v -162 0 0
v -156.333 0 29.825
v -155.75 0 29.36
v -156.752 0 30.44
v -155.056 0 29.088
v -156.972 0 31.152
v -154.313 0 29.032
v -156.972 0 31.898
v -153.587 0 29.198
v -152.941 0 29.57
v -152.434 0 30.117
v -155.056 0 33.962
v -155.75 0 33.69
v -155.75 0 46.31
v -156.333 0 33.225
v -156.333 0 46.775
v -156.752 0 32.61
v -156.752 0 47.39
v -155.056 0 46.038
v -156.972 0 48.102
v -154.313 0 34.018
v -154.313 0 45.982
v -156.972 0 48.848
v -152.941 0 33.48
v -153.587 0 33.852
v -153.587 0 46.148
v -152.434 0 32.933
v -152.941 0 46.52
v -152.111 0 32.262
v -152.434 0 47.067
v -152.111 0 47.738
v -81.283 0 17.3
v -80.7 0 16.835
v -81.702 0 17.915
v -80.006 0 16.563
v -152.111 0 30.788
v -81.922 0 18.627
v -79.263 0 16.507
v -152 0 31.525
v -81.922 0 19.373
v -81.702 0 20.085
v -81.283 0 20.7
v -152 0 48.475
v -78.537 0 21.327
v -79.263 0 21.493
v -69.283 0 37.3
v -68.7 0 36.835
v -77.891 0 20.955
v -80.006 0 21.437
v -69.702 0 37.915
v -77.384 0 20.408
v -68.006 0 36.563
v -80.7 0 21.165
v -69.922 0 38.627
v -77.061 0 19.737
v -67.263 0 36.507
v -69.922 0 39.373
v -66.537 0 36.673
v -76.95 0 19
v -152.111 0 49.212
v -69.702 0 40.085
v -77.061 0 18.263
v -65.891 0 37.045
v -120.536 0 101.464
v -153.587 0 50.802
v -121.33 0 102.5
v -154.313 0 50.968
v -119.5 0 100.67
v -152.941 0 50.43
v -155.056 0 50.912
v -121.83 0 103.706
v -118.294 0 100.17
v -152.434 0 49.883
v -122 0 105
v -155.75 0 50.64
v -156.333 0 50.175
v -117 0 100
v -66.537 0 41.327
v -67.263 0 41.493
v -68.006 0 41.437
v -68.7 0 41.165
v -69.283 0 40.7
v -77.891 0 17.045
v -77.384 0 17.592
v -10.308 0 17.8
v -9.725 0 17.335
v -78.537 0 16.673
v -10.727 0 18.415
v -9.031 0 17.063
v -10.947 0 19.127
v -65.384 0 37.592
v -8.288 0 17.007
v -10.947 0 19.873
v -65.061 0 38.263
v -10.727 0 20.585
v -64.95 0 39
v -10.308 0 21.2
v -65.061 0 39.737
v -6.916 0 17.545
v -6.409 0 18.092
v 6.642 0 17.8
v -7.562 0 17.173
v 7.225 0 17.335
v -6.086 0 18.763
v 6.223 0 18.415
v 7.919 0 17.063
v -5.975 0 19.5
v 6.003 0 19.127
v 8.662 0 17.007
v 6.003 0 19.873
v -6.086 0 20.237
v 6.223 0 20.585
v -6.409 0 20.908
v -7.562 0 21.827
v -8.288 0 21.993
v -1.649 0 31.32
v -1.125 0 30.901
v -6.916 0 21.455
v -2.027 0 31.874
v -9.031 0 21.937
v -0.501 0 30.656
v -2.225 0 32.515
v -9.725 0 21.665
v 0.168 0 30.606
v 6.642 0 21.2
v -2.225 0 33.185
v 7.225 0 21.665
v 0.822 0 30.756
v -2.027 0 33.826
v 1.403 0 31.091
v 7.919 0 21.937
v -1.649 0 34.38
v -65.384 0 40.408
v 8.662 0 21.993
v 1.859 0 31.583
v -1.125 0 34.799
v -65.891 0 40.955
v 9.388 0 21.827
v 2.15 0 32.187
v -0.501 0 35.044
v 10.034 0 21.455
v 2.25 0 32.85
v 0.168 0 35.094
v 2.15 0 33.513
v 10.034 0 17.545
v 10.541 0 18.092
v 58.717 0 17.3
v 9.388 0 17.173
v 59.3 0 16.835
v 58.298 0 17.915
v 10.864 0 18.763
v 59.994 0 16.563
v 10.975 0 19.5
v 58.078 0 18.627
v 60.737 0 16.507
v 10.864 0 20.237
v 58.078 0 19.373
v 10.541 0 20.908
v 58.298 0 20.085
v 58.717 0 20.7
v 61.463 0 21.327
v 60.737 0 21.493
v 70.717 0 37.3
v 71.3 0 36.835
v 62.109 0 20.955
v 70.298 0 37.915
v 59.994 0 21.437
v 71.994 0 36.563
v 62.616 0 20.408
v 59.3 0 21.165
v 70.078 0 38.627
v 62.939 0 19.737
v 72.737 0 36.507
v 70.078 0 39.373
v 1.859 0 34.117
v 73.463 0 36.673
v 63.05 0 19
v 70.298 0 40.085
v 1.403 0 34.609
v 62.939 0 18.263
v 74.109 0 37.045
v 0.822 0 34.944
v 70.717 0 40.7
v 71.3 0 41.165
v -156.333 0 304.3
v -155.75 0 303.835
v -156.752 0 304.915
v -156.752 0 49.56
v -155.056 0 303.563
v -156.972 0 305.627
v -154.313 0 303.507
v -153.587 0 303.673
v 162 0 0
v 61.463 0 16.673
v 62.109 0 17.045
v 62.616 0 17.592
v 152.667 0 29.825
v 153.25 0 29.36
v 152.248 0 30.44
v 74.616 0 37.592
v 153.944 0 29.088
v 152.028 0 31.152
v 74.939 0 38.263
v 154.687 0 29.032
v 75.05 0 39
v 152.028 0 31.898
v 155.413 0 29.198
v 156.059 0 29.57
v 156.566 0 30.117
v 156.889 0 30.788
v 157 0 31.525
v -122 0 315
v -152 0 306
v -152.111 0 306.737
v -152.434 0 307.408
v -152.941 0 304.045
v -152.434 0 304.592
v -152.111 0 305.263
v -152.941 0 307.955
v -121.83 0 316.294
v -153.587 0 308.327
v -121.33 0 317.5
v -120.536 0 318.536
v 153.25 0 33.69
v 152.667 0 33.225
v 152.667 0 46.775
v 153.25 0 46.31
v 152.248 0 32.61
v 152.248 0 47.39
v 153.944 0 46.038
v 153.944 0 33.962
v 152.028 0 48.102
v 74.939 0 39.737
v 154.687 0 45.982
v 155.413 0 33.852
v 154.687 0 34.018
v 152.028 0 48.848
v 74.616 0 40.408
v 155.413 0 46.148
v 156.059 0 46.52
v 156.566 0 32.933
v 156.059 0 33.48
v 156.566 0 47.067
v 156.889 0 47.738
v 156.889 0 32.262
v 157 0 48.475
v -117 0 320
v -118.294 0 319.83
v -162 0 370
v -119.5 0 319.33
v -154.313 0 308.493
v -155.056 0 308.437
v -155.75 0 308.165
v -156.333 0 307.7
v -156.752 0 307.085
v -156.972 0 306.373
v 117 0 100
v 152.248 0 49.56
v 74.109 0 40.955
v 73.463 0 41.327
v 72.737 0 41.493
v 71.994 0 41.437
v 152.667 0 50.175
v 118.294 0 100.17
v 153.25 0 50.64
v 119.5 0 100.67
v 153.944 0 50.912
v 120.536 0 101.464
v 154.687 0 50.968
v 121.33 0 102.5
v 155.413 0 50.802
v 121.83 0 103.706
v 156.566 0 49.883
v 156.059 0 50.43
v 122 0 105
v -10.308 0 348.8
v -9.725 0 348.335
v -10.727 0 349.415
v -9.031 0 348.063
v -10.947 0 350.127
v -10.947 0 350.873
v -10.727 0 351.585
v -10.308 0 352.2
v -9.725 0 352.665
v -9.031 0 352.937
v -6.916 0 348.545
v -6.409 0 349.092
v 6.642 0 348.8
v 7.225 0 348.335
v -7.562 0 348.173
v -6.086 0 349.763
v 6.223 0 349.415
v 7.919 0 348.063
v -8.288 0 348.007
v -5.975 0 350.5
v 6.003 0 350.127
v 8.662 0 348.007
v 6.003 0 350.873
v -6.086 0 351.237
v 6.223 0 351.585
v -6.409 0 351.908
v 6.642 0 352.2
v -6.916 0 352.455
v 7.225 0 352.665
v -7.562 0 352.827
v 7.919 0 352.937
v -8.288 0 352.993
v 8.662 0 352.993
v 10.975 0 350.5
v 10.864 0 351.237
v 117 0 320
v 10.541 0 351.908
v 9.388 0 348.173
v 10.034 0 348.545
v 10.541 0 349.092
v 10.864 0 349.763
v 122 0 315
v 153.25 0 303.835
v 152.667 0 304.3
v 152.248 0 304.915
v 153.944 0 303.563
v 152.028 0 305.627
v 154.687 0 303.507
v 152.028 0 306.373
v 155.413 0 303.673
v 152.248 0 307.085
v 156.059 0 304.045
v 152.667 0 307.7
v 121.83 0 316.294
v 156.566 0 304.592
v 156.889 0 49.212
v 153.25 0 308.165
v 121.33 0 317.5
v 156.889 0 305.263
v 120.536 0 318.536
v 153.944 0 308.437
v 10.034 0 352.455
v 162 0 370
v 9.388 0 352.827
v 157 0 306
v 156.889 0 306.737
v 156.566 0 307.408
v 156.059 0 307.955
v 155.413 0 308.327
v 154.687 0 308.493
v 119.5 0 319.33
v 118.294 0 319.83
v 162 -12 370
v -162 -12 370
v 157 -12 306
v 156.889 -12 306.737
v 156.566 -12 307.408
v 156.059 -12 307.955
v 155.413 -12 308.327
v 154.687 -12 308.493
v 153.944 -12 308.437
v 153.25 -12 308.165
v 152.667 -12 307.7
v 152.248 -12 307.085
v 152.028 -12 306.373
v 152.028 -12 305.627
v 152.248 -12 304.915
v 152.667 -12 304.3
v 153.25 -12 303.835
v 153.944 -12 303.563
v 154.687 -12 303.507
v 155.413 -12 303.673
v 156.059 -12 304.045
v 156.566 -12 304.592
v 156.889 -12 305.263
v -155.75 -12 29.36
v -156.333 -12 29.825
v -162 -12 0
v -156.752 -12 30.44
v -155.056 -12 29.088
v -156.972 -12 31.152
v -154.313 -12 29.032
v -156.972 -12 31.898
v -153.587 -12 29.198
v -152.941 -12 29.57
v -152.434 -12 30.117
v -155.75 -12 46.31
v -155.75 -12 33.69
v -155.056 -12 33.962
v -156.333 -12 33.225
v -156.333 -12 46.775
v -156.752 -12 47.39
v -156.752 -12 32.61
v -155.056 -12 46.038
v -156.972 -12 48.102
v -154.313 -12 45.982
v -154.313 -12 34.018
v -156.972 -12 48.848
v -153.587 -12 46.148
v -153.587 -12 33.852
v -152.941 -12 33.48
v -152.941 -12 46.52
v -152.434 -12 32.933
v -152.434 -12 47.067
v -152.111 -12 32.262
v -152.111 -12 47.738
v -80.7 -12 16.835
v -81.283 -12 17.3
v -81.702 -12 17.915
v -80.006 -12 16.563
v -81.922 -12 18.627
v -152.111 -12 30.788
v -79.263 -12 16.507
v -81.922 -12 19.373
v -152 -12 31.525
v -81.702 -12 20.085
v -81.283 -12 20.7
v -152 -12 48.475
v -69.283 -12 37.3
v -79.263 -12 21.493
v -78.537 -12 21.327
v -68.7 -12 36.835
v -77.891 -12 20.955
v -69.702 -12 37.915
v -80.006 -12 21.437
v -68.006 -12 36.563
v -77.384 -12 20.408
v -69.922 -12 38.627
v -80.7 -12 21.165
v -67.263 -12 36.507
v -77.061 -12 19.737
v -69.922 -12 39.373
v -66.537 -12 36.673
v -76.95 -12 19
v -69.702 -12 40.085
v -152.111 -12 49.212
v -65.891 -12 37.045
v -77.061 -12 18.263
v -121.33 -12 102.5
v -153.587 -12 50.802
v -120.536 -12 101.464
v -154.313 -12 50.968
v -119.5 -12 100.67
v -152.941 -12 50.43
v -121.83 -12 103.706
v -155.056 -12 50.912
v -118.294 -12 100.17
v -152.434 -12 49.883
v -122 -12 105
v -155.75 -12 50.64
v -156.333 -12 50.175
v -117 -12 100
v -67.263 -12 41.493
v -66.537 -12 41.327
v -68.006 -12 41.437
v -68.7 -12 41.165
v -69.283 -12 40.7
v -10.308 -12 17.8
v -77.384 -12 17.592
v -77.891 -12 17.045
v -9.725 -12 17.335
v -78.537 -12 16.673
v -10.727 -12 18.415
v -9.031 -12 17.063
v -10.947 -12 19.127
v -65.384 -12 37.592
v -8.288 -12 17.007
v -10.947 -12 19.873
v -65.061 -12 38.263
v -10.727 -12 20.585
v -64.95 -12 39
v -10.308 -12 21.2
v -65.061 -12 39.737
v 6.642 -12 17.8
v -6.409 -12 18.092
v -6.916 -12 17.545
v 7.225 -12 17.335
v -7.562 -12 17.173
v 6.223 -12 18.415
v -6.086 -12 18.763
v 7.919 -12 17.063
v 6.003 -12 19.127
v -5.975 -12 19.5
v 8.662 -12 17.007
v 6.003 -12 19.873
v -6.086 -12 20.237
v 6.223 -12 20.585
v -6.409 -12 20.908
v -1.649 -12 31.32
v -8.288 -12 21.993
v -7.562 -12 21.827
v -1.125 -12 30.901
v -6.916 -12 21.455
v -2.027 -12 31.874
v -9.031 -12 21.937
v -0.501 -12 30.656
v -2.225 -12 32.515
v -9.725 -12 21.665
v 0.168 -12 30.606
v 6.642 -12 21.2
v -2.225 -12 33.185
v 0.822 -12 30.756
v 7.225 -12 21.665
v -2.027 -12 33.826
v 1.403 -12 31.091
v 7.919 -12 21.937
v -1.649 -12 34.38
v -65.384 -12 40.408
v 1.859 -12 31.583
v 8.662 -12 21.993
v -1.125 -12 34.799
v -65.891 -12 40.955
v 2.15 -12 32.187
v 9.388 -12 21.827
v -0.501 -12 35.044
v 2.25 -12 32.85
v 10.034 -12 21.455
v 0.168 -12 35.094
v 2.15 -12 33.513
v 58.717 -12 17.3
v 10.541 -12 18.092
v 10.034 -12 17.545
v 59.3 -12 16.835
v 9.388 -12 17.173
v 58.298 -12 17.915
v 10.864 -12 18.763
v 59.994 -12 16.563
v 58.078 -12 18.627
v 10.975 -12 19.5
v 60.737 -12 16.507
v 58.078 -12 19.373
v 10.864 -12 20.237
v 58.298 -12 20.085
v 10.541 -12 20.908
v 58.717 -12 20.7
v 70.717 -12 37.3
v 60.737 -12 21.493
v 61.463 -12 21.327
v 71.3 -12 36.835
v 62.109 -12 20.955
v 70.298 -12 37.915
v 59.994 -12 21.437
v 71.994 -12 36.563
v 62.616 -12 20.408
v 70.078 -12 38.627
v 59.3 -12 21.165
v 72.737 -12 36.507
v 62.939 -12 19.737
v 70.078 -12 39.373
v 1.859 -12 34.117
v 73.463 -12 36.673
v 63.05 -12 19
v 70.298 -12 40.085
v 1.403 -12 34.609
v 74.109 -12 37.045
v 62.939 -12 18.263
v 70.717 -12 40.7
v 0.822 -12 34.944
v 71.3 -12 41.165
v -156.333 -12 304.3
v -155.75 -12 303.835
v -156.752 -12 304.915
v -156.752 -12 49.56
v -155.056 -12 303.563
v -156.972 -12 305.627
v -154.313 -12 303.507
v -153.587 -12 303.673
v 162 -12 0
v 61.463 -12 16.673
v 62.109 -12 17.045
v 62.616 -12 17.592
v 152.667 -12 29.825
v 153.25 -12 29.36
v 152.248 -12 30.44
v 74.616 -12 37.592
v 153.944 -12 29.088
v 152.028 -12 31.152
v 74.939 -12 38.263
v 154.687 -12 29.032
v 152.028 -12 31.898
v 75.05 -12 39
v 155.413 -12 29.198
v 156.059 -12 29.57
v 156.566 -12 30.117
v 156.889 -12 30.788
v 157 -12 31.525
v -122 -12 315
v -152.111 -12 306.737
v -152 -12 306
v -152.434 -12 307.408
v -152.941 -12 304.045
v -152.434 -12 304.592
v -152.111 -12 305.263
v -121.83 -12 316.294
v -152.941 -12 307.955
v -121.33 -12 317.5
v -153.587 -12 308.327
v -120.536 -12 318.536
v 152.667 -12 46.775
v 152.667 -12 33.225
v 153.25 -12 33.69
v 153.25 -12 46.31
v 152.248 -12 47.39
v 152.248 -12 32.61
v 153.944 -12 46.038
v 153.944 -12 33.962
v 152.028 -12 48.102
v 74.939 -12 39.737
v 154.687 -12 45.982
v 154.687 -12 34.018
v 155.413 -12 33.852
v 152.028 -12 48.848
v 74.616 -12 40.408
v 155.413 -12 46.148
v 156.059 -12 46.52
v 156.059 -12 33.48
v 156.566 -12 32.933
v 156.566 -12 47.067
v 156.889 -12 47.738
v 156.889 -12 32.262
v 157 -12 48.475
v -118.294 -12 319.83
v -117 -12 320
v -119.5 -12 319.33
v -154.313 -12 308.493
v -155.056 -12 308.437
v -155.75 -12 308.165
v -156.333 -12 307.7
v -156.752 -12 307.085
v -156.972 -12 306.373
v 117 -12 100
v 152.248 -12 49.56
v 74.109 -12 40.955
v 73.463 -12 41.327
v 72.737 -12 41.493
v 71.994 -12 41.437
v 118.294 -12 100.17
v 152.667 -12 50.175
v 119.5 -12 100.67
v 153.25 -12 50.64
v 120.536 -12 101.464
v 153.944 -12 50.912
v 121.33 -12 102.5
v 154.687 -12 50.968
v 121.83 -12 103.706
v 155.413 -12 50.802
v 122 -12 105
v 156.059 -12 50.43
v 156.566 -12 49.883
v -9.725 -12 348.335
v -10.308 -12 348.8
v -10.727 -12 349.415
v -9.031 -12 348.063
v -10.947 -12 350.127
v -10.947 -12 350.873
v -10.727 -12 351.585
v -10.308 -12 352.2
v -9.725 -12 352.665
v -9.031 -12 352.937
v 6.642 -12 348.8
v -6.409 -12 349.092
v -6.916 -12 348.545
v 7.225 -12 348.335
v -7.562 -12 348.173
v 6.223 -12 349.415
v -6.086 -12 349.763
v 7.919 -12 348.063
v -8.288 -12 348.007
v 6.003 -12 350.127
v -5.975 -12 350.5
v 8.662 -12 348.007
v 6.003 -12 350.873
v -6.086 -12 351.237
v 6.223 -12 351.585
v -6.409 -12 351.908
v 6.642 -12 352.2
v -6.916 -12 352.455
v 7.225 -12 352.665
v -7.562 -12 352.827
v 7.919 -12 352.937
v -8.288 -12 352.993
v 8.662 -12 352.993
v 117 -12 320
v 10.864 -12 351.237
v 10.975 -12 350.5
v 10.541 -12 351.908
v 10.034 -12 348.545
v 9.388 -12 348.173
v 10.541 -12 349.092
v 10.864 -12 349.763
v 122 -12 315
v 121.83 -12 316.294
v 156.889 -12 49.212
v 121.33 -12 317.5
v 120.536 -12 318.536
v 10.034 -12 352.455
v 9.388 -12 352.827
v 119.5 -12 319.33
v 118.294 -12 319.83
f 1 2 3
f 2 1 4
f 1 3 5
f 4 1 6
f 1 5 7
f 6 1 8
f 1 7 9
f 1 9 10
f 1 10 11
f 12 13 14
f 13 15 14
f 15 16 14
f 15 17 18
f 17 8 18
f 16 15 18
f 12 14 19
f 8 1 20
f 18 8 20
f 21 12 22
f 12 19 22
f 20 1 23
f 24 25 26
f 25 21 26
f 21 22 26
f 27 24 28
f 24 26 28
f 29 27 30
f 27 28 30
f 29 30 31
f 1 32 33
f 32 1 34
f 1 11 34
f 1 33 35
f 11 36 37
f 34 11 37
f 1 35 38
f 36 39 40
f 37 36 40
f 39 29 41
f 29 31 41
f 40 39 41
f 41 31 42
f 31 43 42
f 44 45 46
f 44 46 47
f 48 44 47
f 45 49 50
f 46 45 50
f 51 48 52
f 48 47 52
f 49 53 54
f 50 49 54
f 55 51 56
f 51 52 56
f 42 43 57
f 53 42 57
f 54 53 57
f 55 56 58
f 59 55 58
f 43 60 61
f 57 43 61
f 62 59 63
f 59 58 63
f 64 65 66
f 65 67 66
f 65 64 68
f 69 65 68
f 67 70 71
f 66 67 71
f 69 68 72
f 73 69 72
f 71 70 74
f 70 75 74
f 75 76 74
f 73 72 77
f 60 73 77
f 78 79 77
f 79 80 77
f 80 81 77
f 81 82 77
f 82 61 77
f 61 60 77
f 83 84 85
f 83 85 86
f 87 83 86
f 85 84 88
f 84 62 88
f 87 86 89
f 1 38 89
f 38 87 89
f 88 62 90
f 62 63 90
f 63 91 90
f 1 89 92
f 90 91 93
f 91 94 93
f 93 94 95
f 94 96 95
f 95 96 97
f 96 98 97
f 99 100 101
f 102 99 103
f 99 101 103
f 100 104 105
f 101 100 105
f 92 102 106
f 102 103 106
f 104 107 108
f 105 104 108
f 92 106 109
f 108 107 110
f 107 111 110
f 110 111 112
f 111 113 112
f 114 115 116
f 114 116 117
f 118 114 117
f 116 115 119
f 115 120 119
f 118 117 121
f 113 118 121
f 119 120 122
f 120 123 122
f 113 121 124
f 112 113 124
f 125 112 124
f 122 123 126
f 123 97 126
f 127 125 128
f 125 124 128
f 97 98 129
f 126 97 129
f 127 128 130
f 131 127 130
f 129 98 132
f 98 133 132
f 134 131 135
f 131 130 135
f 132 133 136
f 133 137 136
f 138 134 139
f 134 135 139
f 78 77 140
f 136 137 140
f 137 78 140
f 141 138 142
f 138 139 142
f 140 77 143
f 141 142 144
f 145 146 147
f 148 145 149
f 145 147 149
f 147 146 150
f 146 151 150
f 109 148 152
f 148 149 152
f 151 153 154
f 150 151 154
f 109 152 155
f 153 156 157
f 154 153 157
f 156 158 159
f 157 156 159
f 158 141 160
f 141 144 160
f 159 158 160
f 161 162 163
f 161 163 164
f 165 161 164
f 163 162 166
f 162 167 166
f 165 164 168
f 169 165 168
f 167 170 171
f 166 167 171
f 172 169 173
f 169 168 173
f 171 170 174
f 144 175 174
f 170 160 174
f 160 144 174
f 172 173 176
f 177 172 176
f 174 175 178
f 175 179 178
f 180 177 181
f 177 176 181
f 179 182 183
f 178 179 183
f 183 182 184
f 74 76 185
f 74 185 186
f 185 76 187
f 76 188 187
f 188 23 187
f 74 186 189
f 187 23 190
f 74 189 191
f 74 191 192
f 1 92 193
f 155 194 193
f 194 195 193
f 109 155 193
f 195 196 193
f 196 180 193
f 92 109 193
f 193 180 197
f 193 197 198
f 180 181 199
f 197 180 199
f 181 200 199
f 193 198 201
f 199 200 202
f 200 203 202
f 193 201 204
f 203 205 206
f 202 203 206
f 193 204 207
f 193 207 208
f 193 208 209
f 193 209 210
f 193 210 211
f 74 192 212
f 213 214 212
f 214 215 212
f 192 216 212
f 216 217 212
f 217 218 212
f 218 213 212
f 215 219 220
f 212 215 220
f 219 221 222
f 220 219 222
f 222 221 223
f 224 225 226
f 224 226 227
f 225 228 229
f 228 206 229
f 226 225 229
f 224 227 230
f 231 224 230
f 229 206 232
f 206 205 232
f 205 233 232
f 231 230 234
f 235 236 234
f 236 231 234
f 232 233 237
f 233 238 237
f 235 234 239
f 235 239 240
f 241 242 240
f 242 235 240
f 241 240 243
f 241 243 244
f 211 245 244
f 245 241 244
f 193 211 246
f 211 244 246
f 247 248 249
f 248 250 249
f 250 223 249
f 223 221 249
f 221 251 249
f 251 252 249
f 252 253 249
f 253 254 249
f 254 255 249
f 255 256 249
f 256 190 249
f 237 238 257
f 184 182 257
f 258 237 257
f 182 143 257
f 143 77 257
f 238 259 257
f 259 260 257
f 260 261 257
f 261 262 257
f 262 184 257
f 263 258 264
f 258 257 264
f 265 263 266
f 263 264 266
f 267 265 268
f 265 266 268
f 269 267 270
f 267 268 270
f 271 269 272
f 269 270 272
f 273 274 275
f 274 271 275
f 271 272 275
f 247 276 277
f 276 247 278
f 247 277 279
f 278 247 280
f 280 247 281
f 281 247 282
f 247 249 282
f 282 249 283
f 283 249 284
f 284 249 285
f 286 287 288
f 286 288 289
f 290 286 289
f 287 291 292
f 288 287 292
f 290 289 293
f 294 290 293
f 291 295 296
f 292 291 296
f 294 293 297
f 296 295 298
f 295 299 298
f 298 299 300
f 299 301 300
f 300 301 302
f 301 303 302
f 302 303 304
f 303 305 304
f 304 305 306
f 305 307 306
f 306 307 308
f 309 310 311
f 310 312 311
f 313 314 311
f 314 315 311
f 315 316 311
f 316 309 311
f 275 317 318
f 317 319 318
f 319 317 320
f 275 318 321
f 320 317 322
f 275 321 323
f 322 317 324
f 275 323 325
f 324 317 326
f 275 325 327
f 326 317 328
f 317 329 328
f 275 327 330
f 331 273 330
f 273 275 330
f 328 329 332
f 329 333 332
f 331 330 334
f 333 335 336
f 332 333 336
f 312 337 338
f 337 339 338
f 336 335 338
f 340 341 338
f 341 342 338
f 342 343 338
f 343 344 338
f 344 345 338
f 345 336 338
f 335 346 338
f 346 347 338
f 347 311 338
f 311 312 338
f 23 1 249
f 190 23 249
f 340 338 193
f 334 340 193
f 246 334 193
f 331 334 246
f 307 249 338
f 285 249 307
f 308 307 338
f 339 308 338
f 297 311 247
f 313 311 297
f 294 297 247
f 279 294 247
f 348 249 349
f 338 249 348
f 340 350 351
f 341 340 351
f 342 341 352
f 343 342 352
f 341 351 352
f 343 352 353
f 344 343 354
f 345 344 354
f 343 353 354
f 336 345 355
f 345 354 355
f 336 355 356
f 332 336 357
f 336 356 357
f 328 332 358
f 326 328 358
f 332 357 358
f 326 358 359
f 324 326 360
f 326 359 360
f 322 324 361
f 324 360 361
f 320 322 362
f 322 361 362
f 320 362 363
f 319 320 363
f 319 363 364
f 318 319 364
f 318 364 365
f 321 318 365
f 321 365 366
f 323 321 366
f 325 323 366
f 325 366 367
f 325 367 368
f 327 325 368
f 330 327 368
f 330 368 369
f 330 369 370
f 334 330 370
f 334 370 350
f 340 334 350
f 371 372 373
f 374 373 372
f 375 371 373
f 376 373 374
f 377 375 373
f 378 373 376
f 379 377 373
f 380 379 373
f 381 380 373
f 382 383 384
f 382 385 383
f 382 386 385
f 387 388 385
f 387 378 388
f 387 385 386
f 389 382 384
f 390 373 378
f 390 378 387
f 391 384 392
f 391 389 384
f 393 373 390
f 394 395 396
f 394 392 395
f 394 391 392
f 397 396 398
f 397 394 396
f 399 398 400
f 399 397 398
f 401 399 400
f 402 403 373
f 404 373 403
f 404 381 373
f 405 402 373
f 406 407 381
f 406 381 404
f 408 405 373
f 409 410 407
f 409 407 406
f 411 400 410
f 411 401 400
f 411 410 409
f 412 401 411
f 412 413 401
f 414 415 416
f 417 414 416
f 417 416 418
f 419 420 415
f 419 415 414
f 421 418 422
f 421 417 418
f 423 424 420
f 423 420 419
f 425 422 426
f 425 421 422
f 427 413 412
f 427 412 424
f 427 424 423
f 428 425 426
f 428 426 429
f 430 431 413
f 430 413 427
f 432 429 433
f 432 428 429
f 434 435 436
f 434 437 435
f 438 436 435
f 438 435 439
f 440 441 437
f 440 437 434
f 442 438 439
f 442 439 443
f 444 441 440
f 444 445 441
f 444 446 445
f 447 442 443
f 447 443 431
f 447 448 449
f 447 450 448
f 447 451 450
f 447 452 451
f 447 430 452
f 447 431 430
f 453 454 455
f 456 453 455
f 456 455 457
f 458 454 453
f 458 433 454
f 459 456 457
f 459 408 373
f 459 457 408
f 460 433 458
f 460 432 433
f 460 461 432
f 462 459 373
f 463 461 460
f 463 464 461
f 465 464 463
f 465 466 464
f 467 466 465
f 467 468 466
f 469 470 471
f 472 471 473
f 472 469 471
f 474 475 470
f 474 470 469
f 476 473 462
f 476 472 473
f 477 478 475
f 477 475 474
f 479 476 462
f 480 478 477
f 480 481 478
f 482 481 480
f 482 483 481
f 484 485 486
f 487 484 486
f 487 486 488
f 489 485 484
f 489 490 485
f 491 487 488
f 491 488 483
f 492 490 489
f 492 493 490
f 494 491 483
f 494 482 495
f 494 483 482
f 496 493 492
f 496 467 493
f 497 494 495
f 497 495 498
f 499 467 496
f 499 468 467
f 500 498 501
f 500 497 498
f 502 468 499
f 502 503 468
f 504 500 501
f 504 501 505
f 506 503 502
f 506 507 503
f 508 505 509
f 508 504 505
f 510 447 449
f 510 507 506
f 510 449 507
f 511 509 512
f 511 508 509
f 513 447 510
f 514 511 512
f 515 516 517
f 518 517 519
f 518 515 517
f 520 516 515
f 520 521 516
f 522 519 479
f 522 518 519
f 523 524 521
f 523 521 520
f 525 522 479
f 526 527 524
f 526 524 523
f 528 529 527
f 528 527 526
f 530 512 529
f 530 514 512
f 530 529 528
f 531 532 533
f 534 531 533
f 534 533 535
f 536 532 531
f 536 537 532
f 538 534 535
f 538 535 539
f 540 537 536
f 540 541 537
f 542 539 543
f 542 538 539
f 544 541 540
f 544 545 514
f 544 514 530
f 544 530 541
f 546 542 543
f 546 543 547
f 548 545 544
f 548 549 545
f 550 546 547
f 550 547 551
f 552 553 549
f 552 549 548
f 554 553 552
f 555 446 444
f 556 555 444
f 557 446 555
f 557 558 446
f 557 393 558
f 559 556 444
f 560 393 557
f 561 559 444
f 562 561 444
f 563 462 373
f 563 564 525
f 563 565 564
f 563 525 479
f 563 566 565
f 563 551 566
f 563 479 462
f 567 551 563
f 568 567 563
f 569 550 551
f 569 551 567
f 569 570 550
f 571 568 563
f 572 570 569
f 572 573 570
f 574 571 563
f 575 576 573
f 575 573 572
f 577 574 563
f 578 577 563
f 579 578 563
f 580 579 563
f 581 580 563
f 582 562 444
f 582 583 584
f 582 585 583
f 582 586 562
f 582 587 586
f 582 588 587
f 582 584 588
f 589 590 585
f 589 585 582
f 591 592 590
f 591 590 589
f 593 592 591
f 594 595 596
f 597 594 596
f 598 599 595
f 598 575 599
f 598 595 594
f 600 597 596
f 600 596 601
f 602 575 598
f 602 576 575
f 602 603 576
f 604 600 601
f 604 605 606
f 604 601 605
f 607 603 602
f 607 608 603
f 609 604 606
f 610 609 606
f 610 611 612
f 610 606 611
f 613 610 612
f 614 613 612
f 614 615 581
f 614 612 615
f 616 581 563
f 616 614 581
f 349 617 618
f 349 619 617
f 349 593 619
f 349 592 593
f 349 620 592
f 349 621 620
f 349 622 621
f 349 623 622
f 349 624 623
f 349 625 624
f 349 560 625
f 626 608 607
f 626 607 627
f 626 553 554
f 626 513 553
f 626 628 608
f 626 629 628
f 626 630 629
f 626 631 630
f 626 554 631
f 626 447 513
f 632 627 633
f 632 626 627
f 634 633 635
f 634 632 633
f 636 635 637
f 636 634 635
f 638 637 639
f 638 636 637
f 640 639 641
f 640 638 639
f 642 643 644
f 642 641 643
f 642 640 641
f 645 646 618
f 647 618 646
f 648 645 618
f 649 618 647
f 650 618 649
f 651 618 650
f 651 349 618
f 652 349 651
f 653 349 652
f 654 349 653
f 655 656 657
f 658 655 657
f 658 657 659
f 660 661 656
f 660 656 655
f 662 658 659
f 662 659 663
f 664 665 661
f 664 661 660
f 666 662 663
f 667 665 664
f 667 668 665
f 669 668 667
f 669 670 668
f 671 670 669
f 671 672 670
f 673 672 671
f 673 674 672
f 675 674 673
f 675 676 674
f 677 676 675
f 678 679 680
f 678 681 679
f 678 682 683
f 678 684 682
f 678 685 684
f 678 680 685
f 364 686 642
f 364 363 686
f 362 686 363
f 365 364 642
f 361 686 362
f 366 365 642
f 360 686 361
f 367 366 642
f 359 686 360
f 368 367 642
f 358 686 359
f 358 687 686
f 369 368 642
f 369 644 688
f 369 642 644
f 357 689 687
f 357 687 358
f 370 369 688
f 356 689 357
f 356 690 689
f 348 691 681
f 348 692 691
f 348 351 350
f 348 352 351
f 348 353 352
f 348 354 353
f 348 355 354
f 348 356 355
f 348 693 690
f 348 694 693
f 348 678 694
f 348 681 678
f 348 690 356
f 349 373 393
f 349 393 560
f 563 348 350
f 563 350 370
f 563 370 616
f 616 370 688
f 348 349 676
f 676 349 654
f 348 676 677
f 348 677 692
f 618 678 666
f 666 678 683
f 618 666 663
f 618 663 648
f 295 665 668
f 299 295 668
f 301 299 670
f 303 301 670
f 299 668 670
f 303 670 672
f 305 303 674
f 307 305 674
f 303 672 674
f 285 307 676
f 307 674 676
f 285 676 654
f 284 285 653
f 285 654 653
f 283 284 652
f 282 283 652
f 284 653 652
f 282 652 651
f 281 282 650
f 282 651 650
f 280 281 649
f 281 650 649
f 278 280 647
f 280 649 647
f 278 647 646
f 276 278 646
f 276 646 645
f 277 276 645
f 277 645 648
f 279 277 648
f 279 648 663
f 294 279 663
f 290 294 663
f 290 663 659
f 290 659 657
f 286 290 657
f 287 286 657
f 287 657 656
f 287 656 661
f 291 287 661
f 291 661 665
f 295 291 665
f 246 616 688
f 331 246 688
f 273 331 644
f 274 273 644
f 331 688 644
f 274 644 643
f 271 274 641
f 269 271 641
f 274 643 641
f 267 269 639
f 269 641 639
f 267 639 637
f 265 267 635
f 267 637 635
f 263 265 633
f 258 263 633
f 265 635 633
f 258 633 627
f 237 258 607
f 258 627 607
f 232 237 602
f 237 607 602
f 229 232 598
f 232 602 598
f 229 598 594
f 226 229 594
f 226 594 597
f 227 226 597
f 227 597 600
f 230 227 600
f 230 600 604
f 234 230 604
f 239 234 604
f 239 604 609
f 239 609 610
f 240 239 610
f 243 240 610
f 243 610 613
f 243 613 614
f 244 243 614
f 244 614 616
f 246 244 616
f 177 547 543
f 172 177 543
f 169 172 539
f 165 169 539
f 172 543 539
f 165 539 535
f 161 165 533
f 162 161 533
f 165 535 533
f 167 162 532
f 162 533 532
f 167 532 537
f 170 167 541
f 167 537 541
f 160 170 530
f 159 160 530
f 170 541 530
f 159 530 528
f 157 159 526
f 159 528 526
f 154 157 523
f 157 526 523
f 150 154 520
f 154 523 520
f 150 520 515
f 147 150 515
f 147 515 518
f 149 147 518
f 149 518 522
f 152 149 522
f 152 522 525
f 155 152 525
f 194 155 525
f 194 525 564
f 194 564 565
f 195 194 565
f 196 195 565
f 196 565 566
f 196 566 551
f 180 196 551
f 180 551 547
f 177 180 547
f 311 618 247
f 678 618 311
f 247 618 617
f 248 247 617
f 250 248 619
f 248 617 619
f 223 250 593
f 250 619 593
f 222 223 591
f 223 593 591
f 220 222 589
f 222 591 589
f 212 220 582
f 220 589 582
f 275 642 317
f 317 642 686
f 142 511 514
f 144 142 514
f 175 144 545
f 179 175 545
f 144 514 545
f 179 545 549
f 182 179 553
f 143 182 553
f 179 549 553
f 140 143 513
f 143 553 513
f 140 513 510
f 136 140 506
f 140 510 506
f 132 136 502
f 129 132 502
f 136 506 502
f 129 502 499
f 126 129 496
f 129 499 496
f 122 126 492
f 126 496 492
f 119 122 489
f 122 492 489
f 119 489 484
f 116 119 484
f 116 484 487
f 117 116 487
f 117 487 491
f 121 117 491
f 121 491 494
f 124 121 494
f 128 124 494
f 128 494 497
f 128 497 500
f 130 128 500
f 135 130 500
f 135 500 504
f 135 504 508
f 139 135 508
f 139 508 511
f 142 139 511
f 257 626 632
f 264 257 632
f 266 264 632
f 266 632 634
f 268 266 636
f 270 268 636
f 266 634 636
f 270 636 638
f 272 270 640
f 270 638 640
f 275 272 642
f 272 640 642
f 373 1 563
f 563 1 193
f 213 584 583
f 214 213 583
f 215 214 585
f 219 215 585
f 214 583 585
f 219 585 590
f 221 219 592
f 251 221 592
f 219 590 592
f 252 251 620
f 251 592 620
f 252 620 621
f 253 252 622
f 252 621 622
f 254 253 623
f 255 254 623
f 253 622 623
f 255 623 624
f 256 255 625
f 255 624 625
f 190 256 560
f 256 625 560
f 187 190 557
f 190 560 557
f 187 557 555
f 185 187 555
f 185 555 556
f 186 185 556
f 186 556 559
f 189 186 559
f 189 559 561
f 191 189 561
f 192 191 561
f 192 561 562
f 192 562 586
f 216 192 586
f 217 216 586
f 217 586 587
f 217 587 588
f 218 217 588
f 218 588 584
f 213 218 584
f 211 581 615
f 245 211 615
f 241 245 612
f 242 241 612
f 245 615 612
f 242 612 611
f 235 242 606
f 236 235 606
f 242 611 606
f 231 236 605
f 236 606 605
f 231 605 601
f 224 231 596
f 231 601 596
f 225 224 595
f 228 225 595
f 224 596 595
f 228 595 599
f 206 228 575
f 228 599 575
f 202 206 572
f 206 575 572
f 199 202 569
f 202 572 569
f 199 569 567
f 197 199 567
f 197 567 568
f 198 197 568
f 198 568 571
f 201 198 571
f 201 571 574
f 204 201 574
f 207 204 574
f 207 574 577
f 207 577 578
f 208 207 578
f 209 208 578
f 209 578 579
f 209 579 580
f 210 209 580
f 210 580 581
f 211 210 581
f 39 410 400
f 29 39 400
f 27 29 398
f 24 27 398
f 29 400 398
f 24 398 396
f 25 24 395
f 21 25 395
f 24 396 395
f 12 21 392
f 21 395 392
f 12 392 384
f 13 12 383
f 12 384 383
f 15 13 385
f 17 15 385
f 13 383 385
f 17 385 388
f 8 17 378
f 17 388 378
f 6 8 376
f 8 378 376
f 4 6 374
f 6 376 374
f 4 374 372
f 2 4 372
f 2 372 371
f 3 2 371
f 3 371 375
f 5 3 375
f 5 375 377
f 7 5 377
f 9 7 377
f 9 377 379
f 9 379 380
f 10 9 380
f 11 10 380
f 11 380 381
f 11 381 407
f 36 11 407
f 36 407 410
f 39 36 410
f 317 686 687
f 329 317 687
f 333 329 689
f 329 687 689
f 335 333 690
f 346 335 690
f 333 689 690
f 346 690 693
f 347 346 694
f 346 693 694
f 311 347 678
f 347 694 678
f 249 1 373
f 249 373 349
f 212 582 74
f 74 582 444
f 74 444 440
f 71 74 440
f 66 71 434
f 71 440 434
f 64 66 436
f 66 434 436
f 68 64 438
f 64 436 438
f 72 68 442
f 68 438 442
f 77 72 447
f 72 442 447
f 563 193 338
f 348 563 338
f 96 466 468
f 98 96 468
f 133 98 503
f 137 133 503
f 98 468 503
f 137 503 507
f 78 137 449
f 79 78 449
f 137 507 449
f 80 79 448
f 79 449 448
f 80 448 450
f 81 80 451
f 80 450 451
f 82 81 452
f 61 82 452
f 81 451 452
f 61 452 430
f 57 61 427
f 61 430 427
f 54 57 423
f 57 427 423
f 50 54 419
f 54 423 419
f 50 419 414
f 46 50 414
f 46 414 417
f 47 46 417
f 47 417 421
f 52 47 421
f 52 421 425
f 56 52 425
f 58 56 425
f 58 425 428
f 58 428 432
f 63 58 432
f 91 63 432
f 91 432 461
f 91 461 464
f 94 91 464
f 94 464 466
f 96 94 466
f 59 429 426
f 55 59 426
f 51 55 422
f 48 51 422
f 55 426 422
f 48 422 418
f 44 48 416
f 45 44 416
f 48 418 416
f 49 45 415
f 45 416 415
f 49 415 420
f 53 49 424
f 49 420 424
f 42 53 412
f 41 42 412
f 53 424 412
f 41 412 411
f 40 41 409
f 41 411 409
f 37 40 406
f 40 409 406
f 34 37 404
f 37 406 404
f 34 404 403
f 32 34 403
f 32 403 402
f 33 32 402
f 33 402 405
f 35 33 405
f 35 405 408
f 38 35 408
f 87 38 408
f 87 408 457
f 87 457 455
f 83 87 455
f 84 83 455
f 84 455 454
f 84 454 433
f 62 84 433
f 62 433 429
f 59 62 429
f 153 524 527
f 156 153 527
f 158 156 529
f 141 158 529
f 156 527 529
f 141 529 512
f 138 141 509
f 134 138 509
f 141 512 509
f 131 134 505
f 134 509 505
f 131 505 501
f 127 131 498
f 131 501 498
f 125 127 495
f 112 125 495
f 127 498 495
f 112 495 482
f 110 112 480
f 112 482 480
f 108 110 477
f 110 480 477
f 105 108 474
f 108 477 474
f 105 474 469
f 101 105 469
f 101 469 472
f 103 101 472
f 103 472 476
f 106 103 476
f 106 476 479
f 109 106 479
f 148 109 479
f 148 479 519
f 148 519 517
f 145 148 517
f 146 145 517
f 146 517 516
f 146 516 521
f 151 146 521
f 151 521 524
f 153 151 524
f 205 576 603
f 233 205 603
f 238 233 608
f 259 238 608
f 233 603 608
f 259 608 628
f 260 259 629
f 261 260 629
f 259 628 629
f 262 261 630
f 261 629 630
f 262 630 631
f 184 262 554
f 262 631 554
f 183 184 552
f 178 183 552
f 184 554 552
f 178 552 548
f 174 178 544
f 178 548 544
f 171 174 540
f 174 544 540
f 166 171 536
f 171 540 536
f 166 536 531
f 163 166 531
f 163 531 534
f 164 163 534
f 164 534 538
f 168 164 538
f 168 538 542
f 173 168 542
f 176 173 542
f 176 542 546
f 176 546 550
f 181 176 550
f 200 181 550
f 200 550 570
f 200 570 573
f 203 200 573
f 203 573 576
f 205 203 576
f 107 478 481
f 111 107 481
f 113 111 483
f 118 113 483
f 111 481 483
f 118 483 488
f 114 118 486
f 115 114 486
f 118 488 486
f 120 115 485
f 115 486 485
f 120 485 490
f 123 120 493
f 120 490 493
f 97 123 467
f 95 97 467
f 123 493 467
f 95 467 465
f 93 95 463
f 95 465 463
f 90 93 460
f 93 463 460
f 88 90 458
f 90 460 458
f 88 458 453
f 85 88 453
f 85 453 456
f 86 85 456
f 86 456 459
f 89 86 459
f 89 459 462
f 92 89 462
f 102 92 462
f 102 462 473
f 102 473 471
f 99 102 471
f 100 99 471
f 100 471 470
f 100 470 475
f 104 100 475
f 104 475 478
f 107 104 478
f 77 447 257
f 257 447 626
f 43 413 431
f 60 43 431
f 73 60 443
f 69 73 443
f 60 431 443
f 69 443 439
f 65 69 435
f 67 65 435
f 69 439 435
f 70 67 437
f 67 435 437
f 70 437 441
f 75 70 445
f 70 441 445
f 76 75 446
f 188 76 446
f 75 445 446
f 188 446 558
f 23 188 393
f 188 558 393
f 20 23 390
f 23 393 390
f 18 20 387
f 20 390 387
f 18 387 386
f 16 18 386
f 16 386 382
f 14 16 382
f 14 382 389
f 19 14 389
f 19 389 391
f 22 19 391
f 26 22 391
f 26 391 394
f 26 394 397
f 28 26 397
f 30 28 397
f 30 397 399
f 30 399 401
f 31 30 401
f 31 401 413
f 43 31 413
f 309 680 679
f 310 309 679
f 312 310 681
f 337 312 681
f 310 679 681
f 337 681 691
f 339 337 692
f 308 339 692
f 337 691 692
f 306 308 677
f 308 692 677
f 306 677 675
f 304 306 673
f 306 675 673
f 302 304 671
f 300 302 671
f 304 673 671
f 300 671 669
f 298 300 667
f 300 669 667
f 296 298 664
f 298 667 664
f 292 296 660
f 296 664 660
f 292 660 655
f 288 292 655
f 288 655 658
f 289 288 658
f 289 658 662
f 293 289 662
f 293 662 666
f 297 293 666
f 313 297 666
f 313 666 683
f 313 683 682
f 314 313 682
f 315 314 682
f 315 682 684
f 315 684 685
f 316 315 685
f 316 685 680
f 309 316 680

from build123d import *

# Parameters (mm, degrees)
SKETCH_W        = 324
SKETCH_H        = 370
PAD_DEPTH       = 12
POCKET_DEPTH    = 12.001
SKETCH002_R     = 2.5
POCKET001_DEPTH = 12.001
SKETCH003_R     = 2.5
SKETCH003_R_2   = 2.25
POCKET002_DEPTH = 12.001


with BuildPart() as part:
    # Sketch → Pad (new body)
    with BuildSketch(Plane.XZ):
        with Locations((0, 185)):
            Rectangle(SKETCH_W, SKETCH_H)
    extrude(amount=PAD_DEPTH)

    # Sketch001 → Pocket (cut, through all)
    with BuildSketch(Plane.XZ.offset(12)):
        with BuildLine():
            ThreePointArc((-116.999969, 320), (-120.535523, 318.535545), (-122, 315))
            Line((-122, 315), (-122, 105))
            ThreePointArc((-122, 105), (-120.535523, 101.464455), (-116.999969, 100))
            Line((-116.999969, 100), (116.999969, 100))
            ThreePointArc((116.999969, 100), (120.535503, 101.464466), (121.999969, 105))
            Line((121.999969, 105), (121.999969, 315))
            ThreePointArc((121.999969, 315), (120.535503, 318.535534), (116.999969, 320))
            Line((-116.999969, 320), (116.999969, 320))
        make_face()
    extrude(amount=-POCKET_DEPTH, mode=Mode.SUBTRACT)

    # Sketch002 → Pocket001 (cut, through all)
    with BuildSketch(Plane.XZ.offset(12)):
        with Locations((-8.475, 19.5)):
            Circle(SKETCH002_R)
        with Locations((8.475, 19.5)):
            Circle(SKETCH002_R)
        with Locations((-8.475, 350.5)):
            Circle(SKETCH002_R)
        with Locations((8.475, 350.5)):
            Circle(SKETCH002_R)
        with Locations((154.5, 31.525)):
            Circle(SKETCH002_R)
        with Locations((154.5, 306)):
            Circle(SKETCH002_R)
        with Locations((-154.5, 306)):
            Circle(SKETCH002_R)
        with Locations((-154.5, 31.525)):
            Circle(SKETCH002_R)
        with Locations((-154.5, 48.475)):
            Circle(SKETCH002_R)
        with Locations((154.5, 48.475)):
            Circle(SKETCH002_R)
    extrude(amount=-POCKET001_DEPTH, mode=Mode.SUBTRACT)

    # Sketch003 → Pocket002 (cut, through all)
    with BuildSketch(Plane.XZ.offset(12)):
        with Locations((-79.45, 19)):
            Circle(SKETCH003_R)
        with Locations((-67.45, 39)):
            Circle(SKETCH003_R)
        with Locations((60.55, 19)):
            Circle(SKETCH003_R)
        with Locations((72.55, 39)):
            Circle(SKETCH003_R)
        with Locations((0, 32.85)):
            Circle(SKETCH003_R_2)
    extrude(amount=-POCKET002_DEPTH, mode=Mode.SUBTRACT)


solid = part.part
